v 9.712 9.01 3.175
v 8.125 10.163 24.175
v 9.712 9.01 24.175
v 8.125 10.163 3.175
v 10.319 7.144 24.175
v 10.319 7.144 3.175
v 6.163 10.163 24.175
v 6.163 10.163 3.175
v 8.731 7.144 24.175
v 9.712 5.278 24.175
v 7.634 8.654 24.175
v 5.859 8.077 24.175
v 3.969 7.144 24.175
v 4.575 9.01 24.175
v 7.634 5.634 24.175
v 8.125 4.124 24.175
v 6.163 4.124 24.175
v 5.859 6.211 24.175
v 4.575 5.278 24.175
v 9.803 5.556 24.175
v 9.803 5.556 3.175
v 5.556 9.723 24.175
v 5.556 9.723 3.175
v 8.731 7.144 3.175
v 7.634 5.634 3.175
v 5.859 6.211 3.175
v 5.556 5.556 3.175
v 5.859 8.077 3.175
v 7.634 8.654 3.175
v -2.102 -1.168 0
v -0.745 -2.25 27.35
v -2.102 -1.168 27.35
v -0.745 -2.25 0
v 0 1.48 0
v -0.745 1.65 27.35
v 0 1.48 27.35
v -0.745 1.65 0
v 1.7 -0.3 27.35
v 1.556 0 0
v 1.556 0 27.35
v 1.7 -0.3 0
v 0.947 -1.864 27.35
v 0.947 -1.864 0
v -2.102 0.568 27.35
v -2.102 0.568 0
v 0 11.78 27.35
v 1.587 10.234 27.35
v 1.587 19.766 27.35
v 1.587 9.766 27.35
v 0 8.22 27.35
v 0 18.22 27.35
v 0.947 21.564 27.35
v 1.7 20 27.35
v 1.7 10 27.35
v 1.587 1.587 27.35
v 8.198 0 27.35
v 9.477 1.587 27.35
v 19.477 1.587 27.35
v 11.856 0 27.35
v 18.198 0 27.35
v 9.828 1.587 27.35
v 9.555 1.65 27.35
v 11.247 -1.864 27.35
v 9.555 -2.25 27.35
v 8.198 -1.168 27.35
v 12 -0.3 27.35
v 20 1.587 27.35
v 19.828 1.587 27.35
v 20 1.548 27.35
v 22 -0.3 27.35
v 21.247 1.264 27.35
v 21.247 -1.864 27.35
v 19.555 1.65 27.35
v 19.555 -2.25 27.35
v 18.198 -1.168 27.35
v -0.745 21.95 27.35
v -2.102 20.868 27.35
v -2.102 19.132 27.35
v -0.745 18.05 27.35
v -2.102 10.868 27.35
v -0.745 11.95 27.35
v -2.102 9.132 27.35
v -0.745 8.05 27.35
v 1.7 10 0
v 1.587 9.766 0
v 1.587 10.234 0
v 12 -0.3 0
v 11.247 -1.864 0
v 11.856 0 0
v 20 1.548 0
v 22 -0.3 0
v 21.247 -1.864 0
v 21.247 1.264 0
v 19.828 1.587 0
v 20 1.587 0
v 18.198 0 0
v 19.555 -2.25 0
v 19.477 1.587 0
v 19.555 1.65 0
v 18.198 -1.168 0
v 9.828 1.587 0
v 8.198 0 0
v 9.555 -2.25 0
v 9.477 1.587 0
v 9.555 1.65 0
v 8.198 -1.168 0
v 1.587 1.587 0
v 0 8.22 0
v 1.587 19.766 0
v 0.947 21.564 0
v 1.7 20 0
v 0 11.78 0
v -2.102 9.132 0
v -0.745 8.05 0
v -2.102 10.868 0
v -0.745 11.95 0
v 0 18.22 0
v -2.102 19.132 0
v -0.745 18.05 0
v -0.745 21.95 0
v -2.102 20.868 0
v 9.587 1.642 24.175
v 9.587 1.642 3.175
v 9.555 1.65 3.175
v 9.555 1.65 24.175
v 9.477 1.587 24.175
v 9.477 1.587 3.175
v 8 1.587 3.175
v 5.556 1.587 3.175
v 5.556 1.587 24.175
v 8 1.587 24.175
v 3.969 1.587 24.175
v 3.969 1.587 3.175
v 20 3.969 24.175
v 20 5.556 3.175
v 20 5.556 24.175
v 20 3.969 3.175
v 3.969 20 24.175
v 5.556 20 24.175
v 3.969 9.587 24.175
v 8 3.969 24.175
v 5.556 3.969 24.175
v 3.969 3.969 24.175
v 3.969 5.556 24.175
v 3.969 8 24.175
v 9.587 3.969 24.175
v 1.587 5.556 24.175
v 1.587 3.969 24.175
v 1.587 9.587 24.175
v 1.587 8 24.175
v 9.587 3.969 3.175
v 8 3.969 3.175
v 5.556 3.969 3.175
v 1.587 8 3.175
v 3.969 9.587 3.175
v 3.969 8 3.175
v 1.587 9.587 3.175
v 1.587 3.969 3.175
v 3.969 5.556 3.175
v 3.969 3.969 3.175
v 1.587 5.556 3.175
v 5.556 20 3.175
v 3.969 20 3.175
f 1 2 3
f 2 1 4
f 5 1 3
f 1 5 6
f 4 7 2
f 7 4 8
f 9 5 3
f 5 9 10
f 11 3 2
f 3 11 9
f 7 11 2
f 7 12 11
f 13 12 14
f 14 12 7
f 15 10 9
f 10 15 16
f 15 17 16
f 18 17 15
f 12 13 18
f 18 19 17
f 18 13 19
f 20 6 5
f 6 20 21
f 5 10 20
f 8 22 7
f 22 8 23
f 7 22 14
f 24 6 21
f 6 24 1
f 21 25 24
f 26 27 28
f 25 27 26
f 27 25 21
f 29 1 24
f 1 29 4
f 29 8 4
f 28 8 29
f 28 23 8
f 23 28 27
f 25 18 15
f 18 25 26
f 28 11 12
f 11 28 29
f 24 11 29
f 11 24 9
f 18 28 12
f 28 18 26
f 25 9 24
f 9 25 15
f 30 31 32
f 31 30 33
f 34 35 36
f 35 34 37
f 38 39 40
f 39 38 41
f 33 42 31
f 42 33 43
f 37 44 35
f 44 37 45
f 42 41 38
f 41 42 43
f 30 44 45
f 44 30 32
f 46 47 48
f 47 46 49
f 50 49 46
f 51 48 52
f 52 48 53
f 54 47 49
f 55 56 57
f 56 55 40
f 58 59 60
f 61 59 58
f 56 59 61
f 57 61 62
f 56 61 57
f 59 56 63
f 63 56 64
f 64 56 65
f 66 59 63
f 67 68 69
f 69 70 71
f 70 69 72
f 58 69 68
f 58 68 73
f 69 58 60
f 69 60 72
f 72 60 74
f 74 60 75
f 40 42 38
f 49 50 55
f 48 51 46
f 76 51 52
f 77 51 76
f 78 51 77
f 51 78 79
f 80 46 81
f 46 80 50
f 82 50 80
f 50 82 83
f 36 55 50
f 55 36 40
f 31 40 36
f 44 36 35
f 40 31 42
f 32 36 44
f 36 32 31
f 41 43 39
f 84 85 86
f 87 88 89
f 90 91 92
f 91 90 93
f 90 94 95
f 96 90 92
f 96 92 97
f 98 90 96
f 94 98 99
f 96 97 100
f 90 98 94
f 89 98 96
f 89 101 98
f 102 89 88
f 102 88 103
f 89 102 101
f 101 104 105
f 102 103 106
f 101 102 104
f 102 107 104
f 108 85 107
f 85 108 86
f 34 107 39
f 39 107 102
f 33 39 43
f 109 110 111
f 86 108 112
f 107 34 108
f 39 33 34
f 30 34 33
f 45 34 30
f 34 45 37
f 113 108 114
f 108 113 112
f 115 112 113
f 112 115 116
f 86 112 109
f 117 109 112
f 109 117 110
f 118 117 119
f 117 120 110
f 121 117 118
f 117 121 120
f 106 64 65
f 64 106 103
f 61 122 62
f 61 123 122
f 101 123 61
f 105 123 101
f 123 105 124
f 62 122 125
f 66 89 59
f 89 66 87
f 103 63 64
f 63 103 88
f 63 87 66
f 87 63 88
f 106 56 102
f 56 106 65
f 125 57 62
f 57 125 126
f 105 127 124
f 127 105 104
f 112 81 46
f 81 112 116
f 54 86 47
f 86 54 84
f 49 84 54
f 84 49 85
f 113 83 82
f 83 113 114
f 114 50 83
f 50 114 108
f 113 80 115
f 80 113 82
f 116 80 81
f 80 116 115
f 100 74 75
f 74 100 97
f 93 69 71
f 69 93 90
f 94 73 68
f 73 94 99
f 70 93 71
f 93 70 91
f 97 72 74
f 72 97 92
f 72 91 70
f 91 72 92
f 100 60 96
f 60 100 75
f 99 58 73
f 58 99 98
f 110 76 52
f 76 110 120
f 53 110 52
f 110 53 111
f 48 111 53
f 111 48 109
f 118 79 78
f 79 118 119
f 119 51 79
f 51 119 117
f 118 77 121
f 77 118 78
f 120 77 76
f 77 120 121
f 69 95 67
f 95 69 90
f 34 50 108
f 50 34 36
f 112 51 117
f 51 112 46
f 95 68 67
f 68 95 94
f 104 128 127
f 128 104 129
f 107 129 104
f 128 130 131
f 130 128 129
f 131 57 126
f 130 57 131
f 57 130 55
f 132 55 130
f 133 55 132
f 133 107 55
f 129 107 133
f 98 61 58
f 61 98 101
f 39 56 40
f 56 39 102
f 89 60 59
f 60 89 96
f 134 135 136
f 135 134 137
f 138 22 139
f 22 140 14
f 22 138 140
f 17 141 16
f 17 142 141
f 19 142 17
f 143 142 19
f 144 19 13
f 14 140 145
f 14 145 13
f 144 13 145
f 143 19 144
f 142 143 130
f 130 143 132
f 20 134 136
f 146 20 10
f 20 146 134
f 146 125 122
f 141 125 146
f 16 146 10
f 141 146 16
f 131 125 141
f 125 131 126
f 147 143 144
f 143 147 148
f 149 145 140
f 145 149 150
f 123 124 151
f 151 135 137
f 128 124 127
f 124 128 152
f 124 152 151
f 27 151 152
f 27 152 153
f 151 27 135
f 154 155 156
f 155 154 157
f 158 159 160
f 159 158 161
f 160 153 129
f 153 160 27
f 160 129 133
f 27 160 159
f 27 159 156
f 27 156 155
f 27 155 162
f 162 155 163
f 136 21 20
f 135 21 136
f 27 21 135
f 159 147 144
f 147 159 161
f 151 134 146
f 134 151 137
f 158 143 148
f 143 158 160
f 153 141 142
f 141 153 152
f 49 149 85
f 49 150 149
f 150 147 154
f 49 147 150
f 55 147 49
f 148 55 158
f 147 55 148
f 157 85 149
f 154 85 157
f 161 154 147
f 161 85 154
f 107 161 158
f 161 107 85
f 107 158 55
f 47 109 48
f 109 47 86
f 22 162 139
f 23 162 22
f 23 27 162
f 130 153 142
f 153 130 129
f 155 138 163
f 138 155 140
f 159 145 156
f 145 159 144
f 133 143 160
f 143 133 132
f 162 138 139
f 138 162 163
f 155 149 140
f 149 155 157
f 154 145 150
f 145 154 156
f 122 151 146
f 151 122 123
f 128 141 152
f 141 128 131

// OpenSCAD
/**
 * joints2.scad is part of Paper Laptop project.
 * This file contains various models for joining two or
 * more pieces of flat materials together.
 *
 * @author R. S. Doiel, <rsdoiel@gmail.com>
 * copyright (c) 2016 all rights reserved
 * Released under a BSD 2-clause license
 */

/*
# misc notes

|  Inches   | Inches    |  Millimeters |
|(fraction) | (decimal) |              | 
+-----------+-----------+--------------+
|    1/16   |    0.0625 | 1.5875       |
|    1/8    |    0.125  | 3.175        |
|    3/16   |    0.1875 | 4.7625       |
|    1/4    |    0.25   | 6.35         |
|    3/8    |    0.375  | 9.525        |
|    1/2    |    0.5    | 12.7         |
|    5/8    |    0.625  | 15.875       |
|    3/4    |    0.75   | 19.05        |
|    7/8    |    0.875  | 22.225       |
|    1      |    1.0    | 25.4         |

## Raspberry Pi Dimensions

85.60mm x 56mm x 21mm 
(or roughly 3.37″ x 2.21″ x 0.83″)

 */
 
 /*
  * Corner: case corners, units assumed is 1mm
  */
module Corner() {
    // sizing and spacing
    t = 3.175;// Aprox. 1/8 inch.
    side_t = t/2;
    side_l = 20;
    b_spacing = side_l/2;
    inner_h = 21;
    inner_t = t*1.25;
    outer_t = side_t;
    outer_h = inner_h+(2*t);
    bump_r = 2;
    bump_o = -0.3;
 
    // main fastening surface
    translate([t*2.25, t*2.25, t]) {
        difference() {
            // fastener body
            color([1,0,0]) cylinder(h=inner_h, r=t, center=false);
            // bolt hole
            color([0,0,0]) cylinder(h=inner_h, r=t/2, center=false);
        }
    }

    // corner bumper
    translate([bump_o, bump_o, 0]) {
        color([1,0,0]) cylinder(h=outer_h, r=bump_r, center=false);
    }

    // middle bumpers side a
    translate([b_spacing, bump_o, 0]) {
        color([1,0,0]) cylinder(h=outer_h, r=bump_r, center=false);
    }
    
    // middle bumpers side b
    translate([bump_o, b_spacing, 0]) {
        color([1,0,0]) cylinder(h=outer_h, r=bump_r, center=false);
    }

    // end bumpers
    translate([side_l, bump_o, 0]) {
        color([1,0,0]) cylinder(h=outer_h, r=bump_r, center=false);
    }
    translate([bump_o, side_l, 0]) {
        color([1,0,0]) cylinder(h=outer_h, r=bump_r, center=false);
    }
    
    // outer side a
    translate([0, 0, 0]) {
       color([0,1,0]) cube([side_l, side_t, outer_h], center=false);
    }
    
    // Inner side a
    translate([0, t*1.25, t]) {
       color([0,1,0]) cube([side_l, side_t, inner_h], center=false);
    }
    
    // outer side b
    translate([0, 0, 0]) {
       color([0,1,0]) cube([side_t, side_l, outer_h], center=false);
    }
    
    // Inner side b
    translate([t*1.25, 0, t]) {
       color([0,1,0]) cube([side_t, side_l, inner_h], center=false);
    }
    
    // filler corner
    translate([1, 8, t]) {
       color([0,0, 1]) cube([inner_t, outer_t, inner_h], center=false);
    }
    translate([8, 1, t]) {
       color([0,0, 1]) cube([outer_t, inner_t, inner_h], center=false);
    }
}

Corner();
